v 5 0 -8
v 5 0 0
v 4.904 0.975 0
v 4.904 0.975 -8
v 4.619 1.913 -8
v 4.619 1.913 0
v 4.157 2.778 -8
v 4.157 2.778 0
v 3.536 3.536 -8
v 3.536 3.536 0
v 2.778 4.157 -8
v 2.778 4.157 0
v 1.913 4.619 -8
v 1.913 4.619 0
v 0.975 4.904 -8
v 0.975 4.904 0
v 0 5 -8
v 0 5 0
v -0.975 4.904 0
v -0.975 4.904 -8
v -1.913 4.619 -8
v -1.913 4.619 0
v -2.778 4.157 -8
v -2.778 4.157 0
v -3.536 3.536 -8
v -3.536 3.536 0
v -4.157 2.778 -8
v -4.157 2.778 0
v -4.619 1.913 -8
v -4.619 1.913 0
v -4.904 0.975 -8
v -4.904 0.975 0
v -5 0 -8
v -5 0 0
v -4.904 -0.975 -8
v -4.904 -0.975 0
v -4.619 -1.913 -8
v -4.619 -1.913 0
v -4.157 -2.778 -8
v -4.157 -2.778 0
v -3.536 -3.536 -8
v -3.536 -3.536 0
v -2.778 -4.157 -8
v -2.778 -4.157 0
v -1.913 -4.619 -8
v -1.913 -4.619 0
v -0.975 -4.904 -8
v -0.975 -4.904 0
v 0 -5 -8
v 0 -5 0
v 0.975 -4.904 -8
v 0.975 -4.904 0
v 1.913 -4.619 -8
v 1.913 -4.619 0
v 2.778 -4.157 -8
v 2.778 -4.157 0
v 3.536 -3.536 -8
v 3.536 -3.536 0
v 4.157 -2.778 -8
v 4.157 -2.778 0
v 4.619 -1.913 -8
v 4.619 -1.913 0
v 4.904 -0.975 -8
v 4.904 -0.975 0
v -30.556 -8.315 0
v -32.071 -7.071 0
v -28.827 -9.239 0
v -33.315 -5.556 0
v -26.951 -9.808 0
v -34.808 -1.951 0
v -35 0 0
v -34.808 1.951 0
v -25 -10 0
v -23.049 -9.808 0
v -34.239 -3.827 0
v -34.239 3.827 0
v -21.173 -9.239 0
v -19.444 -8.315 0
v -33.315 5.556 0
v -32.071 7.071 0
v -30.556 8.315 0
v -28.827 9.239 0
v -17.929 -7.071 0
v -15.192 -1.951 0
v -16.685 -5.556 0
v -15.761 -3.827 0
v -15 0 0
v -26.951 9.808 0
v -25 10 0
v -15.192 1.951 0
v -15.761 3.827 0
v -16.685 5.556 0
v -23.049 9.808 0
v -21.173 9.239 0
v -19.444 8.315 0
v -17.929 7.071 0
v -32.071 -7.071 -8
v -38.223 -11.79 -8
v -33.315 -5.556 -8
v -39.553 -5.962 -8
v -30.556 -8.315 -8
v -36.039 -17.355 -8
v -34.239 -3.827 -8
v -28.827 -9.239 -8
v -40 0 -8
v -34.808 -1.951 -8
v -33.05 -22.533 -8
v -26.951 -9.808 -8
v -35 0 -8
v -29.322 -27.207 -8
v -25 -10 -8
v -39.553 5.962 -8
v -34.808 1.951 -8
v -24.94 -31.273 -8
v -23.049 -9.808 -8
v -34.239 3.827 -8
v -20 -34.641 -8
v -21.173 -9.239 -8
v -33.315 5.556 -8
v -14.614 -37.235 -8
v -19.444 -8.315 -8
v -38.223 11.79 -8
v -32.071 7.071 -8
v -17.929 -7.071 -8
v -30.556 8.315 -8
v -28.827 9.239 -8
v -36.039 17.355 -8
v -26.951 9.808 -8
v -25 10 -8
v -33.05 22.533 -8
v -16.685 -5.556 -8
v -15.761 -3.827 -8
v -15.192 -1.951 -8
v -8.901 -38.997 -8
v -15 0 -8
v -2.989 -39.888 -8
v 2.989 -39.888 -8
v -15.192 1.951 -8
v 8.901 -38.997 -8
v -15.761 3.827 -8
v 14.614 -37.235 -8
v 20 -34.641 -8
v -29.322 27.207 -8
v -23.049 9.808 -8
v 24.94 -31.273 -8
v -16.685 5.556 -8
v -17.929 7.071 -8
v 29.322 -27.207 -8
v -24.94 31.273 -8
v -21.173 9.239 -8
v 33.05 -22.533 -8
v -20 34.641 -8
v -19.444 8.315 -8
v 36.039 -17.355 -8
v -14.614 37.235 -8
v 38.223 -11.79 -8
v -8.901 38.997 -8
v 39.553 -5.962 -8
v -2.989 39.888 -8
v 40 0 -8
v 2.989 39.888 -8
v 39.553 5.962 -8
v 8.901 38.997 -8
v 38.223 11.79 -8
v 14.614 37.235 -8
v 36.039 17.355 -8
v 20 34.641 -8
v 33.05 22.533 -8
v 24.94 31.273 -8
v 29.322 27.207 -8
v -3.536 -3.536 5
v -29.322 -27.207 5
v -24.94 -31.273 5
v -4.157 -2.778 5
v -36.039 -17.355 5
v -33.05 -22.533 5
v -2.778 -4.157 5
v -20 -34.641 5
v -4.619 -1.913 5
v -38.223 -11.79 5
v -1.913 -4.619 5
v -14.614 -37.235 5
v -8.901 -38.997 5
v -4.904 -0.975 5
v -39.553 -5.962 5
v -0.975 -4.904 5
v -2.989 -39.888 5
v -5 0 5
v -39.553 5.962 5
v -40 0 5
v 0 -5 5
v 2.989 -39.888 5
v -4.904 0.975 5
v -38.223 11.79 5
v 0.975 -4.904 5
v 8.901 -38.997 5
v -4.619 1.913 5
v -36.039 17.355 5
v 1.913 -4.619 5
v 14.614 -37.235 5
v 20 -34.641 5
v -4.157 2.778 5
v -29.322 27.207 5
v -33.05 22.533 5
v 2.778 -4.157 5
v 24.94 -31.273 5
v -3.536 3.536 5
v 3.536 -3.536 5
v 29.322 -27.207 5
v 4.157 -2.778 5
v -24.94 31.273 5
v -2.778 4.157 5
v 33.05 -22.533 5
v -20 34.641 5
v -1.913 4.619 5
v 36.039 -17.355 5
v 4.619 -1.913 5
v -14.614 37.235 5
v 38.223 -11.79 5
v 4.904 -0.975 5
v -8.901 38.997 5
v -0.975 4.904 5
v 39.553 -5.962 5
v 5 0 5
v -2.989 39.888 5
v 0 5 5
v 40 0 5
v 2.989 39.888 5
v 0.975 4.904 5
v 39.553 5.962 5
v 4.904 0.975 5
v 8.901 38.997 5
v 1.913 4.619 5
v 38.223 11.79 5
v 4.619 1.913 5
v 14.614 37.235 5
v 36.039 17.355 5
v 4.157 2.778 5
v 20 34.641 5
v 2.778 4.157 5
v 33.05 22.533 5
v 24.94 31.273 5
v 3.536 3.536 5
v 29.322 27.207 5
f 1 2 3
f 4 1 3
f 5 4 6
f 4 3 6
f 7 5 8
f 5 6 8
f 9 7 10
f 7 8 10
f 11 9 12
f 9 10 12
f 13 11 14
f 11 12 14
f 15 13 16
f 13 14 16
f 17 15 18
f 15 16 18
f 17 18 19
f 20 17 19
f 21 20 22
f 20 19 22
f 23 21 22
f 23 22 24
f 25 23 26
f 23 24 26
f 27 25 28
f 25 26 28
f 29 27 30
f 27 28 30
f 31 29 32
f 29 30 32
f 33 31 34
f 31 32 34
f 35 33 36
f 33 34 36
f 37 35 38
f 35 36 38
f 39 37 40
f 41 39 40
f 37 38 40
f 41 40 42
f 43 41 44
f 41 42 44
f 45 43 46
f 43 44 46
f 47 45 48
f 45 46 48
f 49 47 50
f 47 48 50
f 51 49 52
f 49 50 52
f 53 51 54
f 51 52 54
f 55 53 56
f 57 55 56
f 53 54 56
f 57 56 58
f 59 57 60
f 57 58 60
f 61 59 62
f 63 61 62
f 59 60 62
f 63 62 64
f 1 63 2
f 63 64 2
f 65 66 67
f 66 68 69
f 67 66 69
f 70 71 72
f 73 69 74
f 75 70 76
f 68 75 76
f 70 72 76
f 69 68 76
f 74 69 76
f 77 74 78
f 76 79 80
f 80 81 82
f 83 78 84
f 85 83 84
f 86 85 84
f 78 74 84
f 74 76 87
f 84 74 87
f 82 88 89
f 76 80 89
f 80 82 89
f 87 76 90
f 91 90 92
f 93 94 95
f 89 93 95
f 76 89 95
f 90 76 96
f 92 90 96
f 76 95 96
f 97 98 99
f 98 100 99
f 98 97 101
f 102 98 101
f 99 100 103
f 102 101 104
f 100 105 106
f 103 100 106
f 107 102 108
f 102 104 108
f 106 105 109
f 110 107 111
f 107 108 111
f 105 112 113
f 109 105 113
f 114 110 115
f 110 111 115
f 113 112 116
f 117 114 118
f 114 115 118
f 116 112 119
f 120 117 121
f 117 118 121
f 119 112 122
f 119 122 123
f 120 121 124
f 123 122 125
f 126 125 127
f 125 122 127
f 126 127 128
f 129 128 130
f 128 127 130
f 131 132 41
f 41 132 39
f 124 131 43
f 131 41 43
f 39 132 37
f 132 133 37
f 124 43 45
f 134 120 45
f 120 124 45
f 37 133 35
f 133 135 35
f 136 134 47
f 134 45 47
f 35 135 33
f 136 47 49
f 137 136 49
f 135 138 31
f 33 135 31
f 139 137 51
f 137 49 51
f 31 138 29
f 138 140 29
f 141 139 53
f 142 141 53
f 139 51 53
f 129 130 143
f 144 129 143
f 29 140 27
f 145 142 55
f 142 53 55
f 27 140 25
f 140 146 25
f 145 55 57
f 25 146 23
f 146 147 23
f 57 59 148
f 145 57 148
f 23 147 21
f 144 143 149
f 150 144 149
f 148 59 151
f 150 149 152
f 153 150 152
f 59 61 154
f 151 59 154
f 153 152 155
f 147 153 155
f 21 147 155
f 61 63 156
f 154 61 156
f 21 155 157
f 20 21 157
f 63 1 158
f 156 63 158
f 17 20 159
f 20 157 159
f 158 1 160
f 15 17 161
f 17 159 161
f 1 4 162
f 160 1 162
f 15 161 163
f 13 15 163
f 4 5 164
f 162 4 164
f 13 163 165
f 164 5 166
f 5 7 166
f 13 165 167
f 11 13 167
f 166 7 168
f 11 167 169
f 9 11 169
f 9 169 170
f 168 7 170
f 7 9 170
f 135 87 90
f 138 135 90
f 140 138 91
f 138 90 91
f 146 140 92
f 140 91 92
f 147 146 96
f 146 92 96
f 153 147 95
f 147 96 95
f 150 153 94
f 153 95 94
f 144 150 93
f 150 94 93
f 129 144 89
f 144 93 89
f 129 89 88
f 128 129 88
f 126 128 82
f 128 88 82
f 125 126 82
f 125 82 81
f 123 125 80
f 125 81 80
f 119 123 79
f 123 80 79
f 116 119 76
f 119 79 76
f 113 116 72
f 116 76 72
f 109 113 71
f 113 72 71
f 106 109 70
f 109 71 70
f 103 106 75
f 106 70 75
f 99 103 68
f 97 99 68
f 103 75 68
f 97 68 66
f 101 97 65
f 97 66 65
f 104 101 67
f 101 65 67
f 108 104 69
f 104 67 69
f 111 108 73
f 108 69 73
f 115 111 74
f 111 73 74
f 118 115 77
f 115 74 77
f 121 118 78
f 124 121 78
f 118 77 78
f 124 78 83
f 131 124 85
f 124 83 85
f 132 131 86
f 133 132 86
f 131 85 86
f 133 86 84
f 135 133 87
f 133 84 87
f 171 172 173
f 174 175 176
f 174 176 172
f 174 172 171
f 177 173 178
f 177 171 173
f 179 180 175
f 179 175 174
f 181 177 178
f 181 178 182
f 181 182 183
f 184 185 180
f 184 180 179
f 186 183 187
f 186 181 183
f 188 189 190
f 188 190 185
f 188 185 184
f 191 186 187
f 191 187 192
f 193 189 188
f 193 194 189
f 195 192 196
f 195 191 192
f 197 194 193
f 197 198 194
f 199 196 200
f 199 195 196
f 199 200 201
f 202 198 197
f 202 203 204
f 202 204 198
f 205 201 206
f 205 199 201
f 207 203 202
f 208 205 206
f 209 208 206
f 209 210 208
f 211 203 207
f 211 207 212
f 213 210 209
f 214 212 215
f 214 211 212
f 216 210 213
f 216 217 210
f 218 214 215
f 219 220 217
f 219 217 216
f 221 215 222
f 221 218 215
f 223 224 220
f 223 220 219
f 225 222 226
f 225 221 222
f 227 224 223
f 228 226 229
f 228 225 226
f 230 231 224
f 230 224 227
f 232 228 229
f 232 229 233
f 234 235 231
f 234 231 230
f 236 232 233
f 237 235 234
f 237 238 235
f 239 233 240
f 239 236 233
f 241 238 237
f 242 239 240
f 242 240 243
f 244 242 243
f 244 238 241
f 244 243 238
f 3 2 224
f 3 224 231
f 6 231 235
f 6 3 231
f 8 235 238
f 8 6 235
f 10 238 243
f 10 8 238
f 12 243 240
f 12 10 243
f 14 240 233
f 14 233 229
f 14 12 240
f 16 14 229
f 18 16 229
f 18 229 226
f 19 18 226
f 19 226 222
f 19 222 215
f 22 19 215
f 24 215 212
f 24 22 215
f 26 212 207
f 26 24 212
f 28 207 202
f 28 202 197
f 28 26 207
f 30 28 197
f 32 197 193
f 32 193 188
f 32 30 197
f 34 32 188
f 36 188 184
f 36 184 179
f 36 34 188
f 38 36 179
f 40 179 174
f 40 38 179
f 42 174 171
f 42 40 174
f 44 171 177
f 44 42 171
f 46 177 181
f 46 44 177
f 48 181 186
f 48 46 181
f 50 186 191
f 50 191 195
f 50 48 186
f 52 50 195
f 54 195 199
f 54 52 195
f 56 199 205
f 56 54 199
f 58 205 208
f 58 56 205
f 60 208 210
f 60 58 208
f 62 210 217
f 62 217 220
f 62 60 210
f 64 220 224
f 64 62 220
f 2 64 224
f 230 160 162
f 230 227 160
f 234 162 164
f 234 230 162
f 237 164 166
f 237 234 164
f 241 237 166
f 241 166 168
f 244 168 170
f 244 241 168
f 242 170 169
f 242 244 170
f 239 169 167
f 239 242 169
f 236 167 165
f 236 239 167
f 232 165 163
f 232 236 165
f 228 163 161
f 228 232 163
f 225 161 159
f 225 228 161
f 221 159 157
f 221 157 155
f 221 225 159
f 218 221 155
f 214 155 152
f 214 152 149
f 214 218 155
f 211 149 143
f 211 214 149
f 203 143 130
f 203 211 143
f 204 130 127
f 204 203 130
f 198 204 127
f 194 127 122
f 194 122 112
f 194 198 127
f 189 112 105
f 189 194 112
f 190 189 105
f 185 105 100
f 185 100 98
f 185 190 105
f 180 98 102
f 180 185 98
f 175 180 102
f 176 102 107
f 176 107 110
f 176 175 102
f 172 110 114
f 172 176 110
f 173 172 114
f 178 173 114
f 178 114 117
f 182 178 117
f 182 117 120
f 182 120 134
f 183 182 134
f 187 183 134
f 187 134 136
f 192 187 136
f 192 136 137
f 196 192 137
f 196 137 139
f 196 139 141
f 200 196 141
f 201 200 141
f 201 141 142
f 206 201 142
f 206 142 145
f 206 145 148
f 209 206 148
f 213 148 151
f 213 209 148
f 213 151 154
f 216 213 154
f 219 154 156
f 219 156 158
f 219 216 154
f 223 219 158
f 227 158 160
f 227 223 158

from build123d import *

# Parameters (mm, degrees)
F0_R     = 40
F0_R_2   = 10
F0_R_3   = 5
F1_DEPTH = 5
F2_DEPTH = 8


with BuildPart() as f1:
    # F0 (on Top) → F1 (new body)
    with BuildSketch(Plane.XY):
        Circle(F0_R)
        with Locations((-25, 0)):
            Circle(F0_R_2, mode=Mode.SUBTRACT)
        Circle(F0_R_3, mode=Mode.SUBTRACT)
        with Locations((-25, 0)):
            Circle(F0_R_2)
    extrude(amount=F1_DEPTH)

    # F0 (on Top) → F2 (join)
    with BuildSketch(Plane.XY):
        Circle(F0_R)
        with Locations((-25, 0)):
            Circle(F0_R_2, mode=Mode.SUBTRACT)
        Circle(F0_R_3, mode=Mode.SUBTRACT)
    extrude(amount=-F2_DEPTH)


solid = f1.part
